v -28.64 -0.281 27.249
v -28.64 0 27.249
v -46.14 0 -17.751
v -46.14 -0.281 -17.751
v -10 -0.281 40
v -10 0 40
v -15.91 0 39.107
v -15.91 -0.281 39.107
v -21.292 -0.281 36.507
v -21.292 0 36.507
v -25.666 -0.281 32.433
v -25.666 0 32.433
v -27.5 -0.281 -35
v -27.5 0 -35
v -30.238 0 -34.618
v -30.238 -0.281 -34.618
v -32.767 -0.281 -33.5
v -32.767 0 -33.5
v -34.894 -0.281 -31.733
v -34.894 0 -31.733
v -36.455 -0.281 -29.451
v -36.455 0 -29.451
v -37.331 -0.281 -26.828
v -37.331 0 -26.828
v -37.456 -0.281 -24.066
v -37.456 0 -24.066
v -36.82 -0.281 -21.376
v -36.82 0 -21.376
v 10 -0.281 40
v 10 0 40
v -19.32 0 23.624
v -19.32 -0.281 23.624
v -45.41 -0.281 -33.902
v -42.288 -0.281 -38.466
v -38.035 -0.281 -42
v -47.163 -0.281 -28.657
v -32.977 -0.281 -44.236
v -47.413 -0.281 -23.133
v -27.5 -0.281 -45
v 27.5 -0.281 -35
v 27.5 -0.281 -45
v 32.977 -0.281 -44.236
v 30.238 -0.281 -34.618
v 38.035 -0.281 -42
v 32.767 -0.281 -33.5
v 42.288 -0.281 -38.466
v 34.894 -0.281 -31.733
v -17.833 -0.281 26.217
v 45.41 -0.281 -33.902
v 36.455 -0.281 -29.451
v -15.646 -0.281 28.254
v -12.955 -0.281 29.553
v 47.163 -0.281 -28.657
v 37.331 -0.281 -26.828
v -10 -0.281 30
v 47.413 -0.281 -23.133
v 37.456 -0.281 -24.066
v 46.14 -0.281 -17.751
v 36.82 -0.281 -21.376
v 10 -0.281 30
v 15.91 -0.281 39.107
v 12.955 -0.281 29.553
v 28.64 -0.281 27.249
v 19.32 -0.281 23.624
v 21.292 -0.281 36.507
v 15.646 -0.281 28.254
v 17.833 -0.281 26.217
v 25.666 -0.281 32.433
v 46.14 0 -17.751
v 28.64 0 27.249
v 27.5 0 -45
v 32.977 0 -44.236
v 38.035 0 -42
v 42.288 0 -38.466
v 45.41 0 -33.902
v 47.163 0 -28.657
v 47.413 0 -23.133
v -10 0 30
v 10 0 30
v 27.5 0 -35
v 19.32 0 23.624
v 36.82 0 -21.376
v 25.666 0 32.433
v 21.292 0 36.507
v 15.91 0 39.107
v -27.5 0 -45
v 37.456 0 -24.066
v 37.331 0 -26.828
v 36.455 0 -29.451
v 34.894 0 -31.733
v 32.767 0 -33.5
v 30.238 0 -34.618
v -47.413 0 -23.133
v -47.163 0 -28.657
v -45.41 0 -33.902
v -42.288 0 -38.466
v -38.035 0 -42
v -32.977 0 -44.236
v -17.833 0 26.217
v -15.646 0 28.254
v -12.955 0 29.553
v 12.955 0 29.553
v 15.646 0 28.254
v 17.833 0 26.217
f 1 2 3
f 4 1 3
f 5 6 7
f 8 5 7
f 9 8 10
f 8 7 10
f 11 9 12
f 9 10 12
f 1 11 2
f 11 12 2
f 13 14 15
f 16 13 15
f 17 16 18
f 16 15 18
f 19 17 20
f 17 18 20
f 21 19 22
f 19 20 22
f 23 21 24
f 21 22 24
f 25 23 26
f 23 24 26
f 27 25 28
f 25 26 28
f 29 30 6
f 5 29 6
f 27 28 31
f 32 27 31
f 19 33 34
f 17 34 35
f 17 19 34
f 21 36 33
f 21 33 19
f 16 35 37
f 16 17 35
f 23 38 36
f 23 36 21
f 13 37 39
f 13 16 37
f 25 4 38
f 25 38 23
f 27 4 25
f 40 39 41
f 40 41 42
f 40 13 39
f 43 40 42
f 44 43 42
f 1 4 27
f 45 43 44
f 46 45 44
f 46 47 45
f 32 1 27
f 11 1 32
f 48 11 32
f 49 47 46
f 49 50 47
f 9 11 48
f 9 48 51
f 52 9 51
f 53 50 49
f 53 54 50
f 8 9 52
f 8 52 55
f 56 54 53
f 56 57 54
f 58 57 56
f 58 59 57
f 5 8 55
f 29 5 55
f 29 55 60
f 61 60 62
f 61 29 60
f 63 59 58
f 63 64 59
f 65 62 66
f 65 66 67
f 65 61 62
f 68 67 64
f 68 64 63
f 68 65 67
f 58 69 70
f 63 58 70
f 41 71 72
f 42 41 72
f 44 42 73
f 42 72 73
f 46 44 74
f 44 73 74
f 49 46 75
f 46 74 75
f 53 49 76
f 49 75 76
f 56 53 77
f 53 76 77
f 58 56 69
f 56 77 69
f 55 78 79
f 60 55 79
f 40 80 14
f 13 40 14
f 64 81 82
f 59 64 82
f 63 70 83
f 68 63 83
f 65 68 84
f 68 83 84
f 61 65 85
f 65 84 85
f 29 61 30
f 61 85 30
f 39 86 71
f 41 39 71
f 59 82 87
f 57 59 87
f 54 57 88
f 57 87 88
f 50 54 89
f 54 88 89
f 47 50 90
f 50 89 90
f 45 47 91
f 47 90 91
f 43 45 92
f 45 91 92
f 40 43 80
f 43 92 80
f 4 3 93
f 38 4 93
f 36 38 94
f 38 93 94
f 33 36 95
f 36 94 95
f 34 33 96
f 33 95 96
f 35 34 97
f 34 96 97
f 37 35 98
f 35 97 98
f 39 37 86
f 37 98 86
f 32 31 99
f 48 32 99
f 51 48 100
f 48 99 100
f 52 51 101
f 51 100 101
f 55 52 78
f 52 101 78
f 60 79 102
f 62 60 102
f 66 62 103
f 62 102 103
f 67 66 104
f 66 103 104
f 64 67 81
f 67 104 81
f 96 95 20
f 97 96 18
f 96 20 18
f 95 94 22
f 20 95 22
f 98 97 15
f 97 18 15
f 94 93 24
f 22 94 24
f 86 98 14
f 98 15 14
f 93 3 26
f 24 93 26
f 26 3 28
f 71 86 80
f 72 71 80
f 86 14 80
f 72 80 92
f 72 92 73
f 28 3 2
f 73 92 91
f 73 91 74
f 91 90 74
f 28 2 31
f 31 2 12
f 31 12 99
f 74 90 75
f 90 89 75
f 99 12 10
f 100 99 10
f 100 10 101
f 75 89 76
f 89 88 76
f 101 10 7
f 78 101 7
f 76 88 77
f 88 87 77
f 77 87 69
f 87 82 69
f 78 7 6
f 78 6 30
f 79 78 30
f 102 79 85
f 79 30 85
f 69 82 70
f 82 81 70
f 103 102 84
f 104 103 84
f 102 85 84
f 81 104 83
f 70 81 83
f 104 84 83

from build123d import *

# Parameters (mm, degrees)
F1_DEPTH = 0.28125


with BuildPart() as f1:
    # F0 (on Front) → F1 (new body)
    with BuildSketch(Plane.XZ):
        with BuildLine():
            ThreePointArc((-46.140093, -17.751075), (-44.007248, -36.292066), (-27.5, -45))
            Line((-27.5, -45), (27.5, -45))
            ThreePointArc((27.5, -45), (44.007248, -36.292066), (46.140093, -17.751075))
            Line((46.140093, -17.751075), (28.640093, 27.248925))
            ThreePointArc((28.640093, 27.248925), (21.292066, 36.507248), (10, 40))
            Line((10, 40), (0, 40))
            Line((0, 40), (-10, 40))
            ThreePointArc((-10, 40), (-21.292066, 36.507248), (-28.640093, 27.248925))
            Line((-28.640093, 27.248925), (-46.140093, -17.751075))
        make_face()
        with BuildLine():
            Line((-10, 30), (0, 30))
            Line((0, 30), (10, 30))
            ThreePointArc((10, 30), (15.646033, 28.253624), (19.320047, 23.624463))
            Line((19.320047, 23.624463), (36.820047, -21.375537))
            ThreePointArc((36.820047, -21.375537), (35.753624, -30.646033), (27.5, -35))
            Line((27.5, -35), (-27.5, -35))
            ThreePointArc((-27.5, -35), (-35.753624, -30.646033), (-36.820047, -21.375537))
            Line((-36.820047, -21.375537), (-19.320047, 23.624463))
            ThreePointArc((-19.320047, 23.624463), (-15.646033, 28.253624), (-10, 30))
        make_face(mode=Mode.SUBTRACT)
    extrude(amount=F1_DEPTH)


solid = f1.part
